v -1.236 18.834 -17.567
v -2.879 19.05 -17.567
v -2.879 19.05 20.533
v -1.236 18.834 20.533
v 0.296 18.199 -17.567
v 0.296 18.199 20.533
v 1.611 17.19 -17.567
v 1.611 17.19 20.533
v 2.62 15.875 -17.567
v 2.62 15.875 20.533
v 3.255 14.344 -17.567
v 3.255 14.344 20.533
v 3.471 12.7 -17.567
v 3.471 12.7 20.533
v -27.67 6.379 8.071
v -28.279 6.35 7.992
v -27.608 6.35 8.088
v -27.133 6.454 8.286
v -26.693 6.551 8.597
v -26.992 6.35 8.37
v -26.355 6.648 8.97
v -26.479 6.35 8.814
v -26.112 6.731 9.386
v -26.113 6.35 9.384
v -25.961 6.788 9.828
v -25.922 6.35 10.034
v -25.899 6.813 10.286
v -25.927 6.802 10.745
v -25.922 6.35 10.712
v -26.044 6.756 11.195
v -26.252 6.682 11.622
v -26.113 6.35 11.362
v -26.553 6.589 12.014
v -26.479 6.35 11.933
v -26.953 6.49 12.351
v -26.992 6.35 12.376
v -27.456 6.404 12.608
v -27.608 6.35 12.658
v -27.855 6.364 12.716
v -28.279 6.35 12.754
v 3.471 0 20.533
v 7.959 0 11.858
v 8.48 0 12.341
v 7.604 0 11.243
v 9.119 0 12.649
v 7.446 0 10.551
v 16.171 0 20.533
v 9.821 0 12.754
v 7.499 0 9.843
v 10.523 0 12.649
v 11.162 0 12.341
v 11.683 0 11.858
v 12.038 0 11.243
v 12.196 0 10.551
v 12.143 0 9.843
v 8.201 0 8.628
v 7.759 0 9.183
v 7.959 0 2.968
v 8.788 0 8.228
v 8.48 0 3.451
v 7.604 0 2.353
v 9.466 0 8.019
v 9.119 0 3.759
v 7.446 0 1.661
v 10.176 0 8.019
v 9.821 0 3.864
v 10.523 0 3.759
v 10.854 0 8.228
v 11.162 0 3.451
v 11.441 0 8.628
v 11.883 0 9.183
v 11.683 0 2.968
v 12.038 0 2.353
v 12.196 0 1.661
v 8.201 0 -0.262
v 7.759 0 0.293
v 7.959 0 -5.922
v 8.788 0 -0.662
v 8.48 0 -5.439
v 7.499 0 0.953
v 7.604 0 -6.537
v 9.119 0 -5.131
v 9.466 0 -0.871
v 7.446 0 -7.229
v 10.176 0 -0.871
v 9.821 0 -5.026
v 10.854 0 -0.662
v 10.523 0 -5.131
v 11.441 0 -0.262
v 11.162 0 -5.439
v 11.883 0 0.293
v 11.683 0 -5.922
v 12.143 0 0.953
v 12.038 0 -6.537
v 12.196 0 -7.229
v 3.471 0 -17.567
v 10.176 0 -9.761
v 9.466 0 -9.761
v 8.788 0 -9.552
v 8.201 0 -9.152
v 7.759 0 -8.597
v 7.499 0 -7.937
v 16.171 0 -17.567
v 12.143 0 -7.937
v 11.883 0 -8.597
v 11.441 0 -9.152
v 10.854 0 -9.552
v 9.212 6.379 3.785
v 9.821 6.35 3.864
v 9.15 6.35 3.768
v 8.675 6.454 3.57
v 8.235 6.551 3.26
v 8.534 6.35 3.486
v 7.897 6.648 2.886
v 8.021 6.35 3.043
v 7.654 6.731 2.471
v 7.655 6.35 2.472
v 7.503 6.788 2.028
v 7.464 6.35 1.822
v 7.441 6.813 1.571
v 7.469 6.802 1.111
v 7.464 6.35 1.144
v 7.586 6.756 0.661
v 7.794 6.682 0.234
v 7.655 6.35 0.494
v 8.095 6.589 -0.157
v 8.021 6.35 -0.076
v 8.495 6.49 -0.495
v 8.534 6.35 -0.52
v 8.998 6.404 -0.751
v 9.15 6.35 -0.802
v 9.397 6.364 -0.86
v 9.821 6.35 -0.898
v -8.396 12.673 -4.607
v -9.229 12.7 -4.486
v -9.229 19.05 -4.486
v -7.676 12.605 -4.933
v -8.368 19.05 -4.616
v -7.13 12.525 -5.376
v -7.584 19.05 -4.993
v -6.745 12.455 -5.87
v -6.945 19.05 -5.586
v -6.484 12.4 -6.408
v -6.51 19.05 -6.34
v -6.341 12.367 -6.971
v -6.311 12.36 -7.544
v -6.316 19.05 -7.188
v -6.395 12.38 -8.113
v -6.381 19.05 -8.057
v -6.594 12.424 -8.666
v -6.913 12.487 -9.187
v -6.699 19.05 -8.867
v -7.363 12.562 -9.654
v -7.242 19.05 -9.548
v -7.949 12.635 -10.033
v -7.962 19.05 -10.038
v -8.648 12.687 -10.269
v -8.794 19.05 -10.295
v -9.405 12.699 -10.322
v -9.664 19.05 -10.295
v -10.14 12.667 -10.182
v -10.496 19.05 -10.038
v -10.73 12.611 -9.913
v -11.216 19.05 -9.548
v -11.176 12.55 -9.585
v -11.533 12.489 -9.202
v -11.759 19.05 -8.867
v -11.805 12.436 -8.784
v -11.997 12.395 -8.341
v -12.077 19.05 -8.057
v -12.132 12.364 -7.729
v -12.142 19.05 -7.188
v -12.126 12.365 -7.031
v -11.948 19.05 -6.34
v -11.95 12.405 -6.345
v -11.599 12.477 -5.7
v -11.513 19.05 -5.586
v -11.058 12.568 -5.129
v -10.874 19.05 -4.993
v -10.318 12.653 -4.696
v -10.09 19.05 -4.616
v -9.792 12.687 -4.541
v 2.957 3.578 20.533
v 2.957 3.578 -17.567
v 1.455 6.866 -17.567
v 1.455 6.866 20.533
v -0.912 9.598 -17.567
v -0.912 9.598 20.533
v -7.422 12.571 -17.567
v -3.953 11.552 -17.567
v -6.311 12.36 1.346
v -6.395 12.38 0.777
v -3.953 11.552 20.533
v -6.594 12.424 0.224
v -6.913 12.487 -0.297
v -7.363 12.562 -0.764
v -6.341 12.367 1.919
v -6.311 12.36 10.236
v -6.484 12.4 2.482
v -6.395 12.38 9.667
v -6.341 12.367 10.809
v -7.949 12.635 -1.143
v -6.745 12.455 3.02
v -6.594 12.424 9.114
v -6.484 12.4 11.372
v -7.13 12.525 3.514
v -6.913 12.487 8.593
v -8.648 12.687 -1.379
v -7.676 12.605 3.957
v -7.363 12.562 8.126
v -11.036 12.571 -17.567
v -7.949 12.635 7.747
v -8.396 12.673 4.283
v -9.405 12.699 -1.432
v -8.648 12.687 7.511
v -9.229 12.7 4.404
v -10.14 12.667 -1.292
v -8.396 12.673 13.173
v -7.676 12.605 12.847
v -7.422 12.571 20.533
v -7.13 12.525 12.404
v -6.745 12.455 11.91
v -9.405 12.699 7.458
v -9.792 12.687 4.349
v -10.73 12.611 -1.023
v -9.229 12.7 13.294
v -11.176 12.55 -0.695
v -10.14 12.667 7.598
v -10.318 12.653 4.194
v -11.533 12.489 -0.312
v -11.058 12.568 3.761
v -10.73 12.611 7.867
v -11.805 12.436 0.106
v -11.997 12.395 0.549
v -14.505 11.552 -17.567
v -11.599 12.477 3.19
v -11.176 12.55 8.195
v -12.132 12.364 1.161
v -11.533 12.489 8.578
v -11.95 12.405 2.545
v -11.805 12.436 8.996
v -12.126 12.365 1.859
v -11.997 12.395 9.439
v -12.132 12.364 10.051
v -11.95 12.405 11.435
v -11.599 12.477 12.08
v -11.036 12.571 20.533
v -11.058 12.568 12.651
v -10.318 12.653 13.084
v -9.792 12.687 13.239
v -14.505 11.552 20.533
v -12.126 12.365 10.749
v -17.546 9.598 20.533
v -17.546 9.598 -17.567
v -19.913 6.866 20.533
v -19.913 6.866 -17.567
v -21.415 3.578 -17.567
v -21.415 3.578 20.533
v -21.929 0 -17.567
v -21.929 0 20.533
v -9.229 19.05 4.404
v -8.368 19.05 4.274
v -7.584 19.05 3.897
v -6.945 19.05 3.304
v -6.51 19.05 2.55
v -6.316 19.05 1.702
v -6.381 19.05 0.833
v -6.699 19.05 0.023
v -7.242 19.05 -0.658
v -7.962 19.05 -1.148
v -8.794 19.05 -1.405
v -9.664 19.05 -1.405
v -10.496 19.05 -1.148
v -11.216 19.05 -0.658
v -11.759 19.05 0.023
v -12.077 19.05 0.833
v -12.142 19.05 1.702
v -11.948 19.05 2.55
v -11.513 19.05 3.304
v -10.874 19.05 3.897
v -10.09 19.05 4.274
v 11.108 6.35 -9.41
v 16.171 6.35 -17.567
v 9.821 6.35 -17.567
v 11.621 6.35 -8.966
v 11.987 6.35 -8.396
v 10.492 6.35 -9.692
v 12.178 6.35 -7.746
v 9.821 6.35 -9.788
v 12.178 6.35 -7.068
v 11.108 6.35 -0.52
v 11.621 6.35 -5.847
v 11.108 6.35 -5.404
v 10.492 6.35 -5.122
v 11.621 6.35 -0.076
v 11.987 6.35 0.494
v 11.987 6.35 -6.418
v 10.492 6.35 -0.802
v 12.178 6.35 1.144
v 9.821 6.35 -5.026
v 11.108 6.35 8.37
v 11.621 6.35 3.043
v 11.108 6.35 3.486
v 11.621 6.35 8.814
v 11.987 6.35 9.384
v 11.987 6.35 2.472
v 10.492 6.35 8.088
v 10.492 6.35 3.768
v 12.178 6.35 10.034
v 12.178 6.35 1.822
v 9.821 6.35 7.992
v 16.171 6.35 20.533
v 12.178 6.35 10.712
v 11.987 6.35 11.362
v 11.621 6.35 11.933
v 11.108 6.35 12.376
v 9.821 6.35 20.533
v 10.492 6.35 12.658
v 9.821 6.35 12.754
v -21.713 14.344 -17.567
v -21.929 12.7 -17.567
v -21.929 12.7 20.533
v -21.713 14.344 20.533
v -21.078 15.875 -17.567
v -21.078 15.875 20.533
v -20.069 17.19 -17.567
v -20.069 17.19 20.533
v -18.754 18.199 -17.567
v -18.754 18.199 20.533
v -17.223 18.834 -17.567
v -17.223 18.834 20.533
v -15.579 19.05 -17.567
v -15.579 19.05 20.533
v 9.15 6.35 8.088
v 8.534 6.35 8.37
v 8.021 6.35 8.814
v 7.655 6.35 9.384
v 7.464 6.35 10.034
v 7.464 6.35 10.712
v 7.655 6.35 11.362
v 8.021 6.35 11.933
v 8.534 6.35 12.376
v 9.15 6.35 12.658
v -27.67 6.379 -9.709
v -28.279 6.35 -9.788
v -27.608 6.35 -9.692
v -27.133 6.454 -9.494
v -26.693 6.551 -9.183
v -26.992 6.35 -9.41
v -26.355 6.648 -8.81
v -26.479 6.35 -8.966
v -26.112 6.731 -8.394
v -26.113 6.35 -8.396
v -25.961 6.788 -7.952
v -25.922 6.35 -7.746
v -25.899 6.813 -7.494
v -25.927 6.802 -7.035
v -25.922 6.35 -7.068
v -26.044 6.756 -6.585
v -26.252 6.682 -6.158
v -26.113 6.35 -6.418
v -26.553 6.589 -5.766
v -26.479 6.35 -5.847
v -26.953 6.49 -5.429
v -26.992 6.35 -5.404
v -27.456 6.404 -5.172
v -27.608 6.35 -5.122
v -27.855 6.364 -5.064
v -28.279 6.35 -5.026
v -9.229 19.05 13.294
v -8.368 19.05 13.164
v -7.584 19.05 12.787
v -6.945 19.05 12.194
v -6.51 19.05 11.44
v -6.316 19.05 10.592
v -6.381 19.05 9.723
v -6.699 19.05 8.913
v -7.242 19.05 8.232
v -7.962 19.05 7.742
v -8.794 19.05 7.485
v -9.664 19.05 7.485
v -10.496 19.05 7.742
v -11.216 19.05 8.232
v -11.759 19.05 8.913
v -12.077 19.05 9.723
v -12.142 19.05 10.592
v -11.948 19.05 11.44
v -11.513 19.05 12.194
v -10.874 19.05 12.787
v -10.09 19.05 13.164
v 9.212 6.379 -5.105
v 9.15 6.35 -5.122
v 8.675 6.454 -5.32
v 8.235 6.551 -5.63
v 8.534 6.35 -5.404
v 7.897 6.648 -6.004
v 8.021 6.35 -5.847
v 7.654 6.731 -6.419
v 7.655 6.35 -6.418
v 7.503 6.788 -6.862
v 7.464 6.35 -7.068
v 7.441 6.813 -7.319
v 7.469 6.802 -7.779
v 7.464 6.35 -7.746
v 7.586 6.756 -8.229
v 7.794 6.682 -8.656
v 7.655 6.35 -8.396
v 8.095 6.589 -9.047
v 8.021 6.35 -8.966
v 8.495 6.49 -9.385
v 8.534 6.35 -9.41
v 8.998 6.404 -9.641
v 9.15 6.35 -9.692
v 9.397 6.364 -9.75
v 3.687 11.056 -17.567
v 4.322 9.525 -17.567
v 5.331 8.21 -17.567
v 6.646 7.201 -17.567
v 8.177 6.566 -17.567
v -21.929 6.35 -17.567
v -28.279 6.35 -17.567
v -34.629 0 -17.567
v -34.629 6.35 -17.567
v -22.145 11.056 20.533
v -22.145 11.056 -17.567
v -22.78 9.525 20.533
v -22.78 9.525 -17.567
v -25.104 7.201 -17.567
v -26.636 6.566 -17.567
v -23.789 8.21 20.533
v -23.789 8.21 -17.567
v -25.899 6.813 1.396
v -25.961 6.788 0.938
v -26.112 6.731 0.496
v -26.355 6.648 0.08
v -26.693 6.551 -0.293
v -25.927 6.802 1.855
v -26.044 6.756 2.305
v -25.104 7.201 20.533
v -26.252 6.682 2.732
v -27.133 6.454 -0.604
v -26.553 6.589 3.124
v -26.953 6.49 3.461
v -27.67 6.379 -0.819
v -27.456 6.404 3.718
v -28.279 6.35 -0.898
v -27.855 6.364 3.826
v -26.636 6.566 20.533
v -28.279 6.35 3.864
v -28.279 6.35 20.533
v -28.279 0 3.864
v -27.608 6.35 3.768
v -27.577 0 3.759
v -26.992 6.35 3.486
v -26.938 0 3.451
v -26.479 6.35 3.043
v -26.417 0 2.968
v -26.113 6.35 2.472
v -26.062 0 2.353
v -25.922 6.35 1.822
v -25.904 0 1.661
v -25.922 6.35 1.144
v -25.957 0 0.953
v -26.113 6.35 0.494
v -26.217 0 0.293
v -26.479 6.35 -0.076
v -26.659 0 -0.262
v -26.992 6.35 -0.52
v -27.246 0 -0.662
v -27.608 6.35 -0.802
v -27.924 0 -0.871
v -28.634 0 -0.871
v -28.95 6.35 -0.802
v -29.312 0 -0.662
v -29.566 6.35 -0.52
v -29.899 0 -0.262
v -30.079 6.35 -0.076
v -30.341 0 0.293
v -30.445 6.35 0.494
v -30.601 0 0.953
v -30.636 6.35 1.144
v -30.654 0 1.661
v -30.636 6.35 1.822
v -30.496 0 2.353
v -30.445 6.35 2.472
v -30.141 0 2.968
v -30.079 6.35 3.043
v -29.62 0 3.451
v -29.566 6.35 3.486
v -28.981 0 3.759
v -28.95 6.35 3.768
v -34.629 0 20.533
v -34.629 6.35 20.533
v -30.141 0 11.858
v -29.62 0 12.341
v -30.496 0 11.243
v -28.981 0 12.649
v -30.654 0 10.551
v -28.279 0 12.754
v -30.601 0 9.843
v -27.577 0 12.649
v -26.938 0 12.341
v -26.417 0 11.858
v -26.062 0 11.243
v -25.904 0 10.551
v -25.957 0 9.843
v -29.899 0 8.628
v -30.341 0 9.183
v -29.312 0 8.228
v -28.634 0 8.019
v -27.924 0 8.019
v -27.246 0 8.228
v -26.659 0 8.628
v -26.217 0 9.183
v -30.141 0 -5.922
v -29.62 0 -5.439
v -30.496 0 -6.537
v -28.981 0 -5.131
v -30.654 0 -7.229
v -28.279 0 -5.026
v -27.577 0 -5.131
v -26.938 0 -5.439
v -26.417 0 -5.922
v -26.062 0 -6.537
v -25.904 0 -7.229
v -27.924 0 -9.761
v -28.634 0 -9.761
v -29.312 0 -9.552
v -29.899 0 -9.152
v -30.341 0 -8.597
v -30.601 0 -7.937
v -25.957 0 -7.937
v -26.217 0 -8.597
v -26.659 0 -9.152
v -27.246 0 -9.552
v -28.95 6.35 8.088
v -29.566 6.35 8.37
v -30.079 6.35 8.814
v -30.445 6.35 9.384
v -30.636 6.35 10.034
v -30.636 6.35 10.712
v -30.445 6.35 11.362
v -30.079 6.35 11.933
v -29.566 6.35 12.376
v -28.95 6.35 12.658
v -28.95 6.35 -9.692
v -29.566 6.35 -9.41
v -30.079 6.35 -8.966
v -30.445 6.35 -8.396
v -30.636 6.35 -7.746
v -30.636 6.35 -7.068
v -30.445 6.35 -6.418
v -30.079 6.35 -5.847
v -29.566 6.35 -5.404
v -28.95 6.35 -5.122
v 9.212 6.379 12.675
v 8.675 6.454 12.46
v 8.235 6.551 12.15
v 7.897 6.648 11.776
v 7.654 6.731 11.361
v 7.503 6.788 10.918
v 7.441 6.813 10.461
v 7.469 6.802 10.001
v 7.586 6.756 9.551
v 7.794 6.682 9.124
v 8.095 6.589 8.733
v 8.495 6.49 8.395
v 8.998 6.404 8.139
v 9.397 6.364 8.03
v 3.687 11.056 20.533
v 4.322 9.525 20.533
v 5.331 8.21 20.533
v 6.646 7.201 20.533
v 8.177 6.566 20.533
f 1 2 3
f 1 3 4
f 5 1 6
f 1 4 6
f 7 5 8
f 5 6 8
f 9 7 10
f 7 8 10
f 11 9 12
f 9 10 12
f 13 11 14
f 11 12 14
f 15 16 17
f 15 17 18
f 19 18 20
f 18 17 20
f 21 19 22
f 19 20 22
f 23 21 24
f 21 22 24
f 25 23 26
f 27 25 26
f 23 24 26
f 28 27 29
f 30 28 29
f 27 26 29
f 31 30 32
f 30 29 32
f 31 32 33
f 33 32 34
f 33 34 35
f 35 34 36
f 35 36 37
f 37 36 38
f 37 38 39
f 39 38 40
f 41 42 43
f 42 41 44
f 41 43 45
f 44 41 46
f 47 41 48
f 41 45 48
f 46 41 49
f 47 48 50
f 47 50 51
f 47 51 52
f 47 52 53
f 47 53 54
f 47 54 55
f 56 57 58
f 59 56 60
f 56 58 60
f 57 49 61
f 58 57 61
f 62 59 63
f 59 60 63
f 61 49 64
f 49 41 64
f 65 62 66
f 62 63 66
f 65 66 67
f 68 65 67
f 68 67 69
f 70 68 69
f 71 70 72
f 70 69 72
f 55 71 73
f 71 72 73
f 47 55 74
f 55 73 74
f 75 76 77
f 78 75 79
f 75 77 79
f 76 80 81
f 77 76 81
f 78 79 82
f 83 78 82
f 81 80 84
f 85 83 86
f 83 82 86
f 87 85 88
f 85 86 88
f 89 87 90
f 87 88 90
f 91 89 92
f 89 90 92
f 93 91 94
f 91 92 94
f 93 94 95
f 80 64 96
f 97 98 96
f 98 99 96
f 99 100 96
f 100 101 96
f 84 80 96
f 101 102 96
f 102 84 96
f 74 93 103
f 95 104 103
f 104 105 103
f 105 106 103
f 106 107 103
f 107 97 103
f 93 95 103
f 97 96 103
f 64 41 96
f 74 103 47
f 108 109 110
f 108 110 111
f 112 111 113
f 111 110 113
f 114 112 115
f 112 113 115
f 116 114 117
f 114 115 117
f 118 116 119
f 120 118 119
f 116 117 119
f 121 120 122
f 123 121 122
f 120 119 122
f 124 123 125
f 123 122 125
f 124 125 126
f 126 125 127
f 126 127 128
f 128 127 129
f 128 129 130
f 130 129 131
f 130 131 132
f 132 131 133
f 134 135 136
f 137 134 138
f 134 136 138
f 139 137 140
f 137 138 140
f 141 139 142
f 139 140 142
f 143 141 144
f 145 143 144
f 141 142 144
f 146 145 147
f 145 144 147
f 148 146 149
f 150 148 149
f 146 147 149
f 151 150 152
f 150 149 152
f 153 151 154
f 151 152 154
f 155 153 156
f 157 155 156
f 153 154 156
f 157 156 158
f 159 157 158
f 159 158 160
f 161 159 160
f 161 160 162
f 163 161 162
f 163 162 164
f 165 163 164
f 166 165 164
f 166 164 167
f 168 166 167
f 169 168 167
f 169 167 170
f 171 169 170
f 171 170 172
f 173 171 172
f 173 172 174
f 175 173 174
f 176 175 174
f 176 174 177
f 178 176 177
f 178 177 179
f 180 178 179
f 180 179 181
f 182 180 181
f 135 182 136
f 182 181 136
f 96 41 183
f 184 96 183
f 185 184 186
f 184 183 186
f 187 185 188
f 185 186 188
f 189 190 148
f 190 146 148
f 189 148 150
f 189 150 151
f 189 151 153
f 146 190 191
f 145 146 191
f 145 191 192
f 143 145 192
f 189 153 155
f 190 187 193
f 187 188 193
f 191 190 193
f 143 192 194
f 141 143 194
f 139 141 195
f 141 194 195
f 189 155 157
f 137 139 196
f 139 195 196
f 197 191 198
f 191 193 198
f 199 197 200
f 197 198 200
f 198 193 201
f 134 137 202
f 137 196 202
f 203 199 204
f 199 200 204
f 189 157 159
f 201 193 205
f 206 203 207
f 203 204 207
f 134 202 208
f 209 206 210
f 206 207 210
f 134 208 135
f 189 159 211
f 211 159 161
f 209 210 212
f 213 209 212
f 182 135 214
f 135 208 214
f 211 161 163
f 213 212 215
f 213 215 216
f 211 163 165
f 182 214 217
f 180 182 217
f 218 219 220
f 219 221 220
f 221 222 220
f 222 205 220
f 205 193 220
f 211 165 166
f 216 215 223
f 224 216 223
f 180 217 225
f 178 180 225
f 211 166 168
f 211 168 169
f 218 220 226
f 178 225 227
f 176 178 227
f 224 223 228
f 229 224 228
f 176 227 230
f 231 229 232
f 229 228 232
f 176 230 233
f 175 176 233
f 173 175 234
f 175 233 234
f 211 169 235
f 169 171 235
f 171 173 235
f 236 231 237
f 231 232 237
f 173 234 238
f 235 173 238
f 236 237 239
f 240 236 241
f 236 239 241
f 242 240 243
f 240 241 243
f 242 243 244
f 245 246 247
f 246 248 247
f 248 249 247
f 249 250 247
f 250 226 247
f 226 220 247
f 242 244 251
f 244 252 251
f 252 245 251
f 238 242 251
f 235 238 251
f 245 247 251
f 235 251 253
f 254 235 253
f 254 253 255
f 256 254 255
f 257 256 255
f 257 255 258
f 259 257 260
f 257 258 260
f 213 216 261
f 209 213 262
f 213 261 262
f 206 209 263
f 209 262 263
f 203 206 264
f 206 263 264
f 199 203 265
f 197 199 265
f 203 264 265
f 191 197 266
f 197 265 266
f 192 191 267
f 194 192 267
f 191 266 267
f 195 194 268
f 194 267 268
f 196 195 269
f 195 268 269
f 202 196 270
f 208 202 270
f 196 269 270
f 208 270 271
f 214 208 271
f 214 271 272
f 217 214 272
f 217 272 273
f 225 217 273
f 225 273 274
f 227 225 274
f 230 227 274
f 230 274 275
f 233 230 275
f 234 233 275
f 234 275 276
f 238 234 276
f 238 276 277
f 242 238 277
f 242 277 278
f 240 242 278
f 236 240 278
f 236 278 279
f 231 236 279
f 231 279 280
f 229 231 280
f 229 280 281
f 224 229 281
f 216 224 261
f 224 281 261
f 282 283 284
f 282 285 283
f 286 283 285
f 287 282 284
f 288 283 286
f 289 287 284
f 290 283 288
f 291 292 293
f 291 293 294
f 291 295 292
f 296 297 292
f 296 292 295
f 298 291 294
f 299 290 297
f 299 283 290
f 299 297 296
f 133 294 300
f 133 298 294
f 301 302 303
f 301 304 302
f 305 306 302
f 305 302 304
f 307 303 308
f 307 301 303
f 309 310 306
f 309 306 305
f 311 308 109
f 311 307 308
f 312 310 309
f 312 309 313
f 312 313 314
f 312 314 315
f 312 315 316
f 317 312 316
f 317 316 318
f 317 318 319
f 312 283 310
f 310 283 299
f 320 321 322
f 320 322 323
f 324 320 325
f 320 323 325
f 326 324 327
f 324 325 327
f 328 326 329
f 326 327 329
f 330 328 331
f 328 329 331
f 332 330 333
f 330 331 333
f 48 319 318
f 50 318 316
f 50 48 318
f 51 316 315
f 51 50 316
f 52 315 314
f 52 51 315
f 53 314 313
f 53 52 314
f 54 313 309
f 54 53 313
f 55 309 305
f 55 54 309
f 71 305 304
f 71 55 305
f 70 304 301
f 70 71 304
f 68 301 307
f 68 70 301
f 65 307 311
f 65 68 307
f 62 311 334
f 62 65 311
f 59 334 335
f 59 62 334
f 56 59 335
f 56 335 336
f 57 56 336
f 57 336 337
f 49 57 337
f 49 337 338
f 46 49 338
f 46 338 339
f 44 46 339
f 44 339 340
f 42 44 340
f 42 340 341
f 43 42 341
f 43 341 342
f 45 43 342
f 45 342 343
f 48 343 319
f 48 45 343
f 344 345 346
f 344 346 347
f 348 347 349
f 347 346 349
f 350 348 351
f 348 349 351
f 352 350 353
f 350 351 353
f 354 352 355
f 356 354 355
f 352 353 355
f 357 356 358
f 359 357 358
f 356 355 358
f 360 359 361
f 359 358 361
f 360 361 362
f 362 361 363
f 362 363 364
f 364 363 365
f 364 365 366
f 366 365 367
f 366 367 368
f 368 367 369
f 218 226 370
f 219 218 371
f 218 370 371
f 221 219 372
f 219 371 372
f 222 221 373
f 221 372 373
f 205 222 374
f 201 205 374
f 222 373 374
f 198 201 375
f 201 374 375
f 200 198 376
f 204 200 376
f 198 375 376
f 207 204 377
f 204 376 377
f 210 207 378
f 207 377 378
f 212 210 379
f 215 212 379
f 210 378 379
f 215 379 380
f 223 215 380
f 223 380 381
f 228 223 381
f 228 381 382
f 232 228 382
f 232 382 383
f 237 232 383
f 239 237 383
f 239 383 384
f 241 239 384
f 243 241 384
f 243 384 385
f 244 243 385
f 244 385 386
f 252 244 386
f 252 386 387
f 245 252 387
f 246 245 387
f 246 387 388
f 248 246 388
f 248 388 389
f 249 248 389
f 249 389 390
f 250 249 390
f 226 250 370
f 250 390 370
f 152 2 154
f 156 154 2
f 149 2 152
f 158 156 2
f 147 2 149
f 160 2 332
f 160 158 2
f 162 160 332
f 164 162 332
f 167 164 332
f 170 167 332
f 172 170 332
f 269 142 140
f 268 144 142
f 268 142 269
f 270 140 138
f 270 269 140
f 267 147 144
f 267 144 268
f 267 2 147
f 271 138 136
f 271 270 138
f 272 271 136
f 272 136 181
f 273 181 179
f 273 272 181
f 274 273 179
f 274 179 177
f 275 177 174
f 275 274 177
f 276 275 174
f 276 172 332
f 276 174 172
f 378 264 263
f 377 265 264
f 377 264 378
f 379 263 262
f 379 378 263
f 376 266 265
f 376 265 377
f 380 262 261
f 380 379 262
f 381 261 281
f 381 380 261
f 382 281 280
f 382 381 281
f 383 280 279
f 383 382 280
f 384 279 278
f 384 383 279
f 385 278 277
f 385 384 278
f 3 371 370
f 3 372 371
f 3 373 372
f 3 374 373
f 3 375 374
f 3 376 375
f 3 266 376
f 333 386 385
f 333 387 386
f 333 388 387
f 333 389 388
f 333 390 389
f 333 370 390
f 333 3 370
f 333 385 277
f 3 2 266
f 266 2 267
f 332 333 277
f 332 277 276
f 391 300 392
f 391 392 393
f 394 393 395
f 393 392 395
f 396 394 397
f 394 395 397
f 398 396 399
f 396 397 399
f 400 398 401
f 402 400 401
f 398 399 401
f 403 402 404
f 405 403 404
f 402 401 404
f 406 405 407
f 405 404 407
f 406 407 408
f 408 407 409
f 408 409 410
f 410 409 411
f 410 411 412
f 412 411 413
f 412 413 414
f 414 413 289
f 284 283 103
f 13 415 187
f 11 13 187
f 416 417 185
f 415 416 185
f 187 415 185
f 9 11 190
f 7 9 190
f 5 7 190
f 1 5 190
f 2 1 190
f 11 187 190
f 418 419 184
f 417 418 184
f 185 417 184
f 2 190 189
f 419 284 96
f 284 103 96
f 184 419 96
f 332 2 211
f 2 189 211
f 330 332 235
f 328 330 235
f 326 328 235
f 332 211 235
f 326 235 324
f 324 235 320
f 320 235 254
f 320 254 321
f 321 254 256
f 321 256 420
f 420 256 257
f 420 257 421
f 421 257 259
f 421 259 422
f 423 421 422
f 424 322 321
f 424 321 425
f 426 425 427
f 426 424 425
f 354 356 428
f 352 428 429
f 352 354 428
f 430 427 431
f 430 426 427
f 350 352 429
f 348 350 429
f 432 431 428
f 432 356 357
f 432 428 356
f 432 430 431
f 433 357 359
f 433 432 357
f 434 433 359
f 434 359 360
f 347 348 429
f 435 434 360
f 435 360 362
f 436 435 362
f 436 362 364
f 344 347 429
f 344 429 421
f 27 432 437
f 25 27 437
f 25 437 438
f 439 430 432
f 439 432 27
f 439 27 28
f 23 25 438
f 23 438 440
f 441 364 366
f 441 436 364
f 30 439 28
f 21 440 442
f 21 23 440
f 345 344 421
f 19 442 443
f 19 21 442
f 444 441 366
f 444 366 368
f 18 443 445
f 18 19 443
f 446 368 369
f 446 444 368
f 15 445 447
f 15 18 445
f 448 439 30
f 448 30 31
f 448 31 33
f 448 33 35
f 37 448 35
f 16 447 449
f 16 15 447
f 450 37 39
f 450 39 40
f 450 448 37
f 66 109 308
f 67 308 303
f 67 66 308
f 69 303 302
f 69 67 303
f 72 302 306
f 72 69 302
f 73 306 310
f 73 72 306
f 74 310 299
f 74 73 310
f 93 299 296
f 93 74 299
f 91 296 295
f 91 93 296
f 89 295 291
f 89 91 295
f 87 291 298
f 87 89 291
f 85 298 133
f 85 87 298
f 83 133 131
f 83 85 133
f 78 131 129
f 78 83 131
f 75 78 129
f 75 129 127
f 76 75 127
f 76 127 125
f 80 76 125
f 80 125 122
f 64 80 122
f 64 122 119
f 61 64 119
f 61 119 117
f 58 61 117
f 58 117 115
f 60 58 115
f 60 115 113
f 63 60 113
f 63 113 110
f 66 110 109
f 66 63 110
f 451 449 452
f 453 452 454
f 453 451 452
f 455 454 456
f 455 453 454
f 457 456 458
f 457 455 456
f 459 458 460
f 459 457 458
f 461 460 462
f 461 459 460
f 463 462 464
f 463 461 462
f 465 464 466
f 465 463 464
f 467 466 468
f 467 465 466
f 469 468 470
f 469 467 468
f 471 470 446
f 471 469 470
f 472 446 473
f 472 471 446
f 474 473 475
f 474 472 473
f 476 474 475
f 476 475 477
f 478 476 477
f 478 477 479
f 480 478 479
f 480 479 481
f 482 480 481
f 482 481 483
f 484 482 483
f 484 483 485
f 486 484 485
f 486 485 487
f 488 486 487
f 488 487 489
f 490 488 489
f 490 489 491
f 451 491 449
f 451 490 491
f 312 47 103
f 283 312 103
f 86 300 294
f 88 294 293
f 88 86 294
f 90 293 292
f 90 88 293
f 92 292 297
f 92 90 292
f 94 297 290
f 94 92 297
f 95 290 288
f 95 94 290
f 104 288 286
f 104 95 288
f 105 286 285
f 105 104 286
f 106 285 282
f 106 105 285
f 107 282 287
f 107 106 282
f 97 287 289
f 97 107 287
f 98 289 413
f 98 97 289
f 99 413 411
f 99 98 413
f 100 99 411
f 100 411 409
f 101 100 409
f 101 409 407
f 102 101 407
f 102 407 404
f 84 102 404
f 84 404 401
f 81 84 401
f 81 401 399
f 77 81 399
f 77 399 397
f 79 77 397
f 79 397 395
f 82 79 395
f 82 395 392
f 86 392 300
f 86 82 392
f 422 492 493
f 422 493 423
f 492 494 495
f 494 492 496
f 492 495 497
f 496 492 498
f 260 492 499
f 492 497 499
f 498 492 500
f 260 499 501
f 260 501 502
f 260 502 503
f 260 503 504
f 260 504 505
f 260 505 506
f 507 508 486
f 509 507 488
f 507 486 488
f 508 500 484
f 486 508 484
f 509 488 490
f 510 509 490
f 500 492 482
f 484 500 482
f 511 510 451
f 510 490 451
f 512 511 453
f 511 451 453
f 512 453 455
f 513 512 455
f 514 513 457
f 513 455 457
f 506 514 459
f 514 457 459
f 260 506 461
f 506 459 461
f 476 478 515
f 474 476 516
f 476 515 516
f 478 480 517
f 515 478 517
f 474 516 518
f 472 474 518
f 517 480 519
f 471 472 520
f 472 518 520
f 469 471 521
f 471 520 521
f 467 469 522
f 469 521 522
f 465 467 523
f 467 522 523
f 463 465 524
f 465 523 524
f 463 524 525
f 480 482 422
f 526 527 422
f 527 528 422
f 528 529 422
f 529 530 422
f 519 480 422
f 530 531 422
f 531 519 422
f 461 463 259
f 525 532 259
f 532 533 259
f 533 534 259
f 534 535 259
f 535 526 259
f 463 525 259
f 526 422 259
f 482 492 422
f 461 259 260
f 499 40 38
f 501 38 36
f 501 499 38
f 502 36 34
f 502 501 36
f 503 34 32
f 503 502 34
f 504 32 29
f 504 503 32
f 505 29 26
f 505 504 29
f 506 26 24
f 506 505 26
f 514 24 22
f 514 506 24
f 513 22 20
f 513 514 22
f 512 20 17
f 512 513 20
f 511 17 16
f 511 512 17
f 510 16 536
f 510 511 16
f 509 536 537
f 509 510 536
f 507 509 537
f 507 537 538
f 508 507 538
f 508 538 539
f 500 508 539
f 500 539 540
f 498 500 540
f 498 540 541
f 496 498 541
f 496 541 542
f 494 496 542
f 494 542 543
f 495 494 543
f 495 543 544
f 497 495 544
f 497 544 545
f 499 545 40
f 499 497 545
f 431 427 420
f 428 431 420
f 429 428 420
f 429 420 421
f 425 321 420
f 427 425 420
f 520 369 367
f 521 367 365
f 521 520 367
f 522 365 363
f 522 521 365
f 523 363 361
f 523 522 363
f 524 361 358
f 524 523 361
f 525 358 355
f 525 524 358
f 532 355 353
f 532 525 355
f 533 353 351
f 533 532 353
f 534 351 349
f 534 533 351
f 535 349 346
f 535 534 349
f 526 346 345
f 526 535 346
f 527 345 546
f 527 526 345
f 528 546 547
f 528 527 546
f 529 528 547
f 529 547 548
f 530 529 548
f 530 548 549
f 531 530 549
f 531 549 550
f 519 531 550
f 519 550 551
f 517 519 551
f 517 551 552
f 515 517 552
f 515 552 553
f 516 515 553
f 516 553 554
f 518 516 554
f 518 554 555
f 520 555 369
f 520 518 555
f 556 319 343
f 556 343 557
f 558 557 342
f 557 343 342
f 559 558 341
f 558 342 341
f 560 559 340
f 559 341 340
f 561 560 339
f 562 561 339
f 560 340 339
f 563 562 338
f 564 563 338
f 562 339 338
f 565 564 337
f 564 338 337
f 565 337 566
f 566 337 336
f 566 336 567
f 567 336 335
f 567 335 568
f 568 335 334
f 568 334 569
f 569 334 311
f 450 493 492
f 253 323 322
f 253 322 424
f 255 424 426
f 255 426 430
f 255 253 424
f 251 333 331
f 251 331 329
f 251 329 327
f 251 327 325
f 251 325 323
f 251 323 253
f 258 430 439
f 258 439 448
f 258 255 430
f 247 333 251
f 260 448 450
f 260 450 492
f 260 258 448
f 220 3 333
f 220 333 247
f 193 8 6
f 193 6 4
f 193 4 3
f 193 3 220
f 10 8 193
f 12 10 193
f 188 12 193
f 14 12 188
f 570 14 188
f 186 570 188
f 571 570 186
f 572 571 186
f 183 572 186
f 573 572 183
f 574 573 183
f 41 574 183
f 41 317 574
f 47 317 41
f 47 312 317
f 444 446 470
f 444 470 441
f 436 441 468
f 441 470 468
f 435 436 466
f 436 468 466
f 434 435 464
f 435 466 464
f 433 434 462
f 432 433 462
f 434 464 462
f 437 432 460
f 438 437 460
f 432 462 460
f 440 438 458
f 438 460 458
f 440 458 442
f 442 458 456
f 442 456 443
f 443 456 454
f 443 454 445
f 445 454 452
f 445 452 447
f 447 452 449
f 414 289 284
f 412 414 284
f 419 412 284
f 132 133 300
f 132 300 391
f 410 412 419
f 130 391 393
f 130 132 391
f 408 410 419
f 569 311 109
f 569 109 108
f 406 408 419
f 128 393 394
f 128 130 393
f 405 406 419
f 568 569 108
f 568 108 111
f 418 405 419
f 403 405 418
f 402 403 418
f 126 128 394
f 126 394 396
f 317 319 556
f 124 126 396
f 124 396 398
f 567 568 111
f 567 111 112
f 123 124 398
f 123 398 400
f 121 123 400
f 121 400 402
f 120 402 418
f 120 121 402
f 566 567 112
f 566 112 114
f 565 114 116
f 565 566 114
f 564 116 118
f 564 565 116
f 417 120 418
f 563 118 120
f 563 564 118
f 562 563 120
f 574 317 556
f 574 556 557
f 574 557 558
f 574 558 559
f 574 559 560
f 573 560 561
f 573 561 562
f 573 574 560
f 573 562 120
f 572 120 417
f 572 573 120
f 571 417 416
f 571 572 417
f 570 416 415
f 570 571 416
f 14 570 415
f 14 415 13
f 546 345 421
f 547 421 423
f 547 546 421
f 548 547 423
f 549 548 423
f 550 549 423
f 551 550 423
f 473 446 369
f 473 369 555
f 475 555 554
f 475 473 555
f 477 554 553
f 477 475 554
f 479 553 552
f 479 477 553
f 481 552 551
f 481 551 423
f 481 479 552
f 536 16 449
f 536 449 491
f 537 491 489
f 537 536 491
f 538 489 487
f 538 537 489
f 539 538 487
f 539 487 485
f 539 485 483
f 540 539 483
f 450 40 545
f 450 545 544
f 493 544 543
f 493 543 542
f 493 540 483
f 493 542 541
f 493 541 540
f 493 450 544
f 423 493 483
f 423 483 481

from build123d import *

# Parameters (mm, degrees)
SKETCH1_W           = 50.8
SKETCH1_H           = 38.1
SKETCH1_R           = 2.38125
BOSS_EXTRUDE1_DEPTH = 25.4
CUT_EXTRUDE1_DEPTH  = 58.410261207
FILLET1_R           = 6.35
SKETCH3_R           = 2.921
CUT_EXTRUDE2_DEPTH  = 25.4


with BuildPart() as part:
    # Sketch1 → Boss-Extrude1 (new body)
    with BuildSketch(Plane(origin=(0, 0, 0), x_dir=(1, 0, 0), z_dir=(0, 1, 0))):
        with Locations((-9.229006509, -1.483233189)):
            Rectangle(SKETCH1_W, SKETCH1_H)
        with Locations(Location((-28.279006509, 7.406766811, 0), (0, 0, 270))):
            Circle(SKETCH1_R, mode=Mode.SUBTRACT)
        with Locations(Location((-28.279006509, -1.483233189, 0), (0, 0, 270))):
            Circle(SKETCH1_R, mode=Mode.SUBTRACT)
        with Locations(Location((-28.279006509, -10.373233189, 0), (0, 0, 270))):
            Circle(SKETCH1_R, mode=Mode.SUBTRACT)
        with Locations(Location((9.820993491, -10.373233189, 0), (0, 0, 270))):
            Circle(SKETCH1_R, mode=Mode.SUBTRACT)
        with Locations(Location((9.820993491, -1.483233189, 0), (0, 0, 270))):
            Circle(SKETCH1_R, mode=Mode.SUBTRACT)
        with Locations(Location((9.820993491, 7.406766811, 0), (0, 0, 270))):
            Circle(SKETCH1_R, mode=Mode.SUBTRACT)
    extrude(amount=BOSS_EXTRUDE1_DEPTH)

    # Sketch2 → Cut-Extrude1 (cut, through all)
    with BuildSketch(Plane.XY.offset(20.533233189)):
        with BuildLine():
            Line((-21.929006509, 0), (3.470993491, 0))
            ThreePointArc((3.470993491, 0), (-9.229006509, 12.7), (-21.929006509, 0))
        make_face()
        Polygon((-25.739006509, 25.4), (7.280993491, 25.4), (16.170993491, 25.4), (16.170993491, 6.35), (3.470993491, 6.35), (3.470993491, 19.05), (-21.929006509, 19.05), (-21.929006509, 6.35), (-34.629006509, 6.35), (-34.629006509, 25.4), align=None)
    extrude(amount=-CUT_EXTRUDE1_DEPTH, mode=Mode.SUBTRACT)

    # Fillet1
    # the kernel refuses this fillet: 6.35 mm, written as the material it adds along each edge
    with BuildSketch(Plane(origin=(3.470993491, 6.35, 20.533233189), x_dir=(1, 0, 0), z_dir=(0, 0, -1))) as fillet1_piece_1_section:
        with BuildLine():
            CenterArc((FILLET1_R, -FILLET1_R), FILLET1_R, 90, 90)
            Line((0, -FILLET1_R), (0, 0))
            Line((0, 0), (FILLET1_R, 0))
        make_face()
    fillet1_piece_1 = extrude(amount=38.1, mode=Mode.PRIVATE)
    fillet1_piece_1 = fillet1_piece_1 - Plane(origin=(9.820993491, 7.811257132, -7.406766811), x_dir=(0, 0, 1), z_dir=(0, -1, 0)) * Cylinder(2.38125, 102, mode=Mode.PRIVATE)
    fillet1_piece_1 = fillet1_piece_1 - Plane(origin=(9.820993491, 7.811257132, 1.483233189), x_dir=(0, 0, 1), z_dir=(0, -1, 0)) * Cylinder(2.38125, 102, mode=Mode.PRIVATE)
    fillet1_piece_1 = fillet1_piece_1 - Plane(origin=(9.820993491, 7.811257132, 10.373233189), x_dir=(0, 0, 1), z_dir=(0, -1, 0)) * Cylinder(2.38125, 102, mode=Mode.PRIVATE)
    add(fillet1_piece_1)
    with BuildSketch(Plane(origin=(-21.929006509, 6.35, 20.533233189), x_dir=(0, 1, 0), z_dir=(0, 0, -1))) as fillet1_piece_2_section:
        with BuildLine():
            CenterArc((FILLET1_R, -FILLET1_R), FILLET1_R, 90, 90)
            Line((0, -FILLET1_R), (0, 0))
            Line((0, 0), (FILLET1_R, 0))
        make_face()
    fillet1_piece_2 = extrude(amount=38.1, mode=Mode.PRIVATE)
    fillet1_piece_2 = fillet1_piece_2 - Plane(origin=(-28.279006509, 7.811257363, -7.406766811), x_dir=(0, 0, 1), z_dir=(0, -1, 0)) * Cylinder(2.38125, 102, mode=Mode.PRIVATE)
    fillet1_piece_2 = fillet1_piece_2 - Plane(origin=(-28.279006509, 7.811257363, 1.483233189), x_dir=(0, 0, 1), z_dir=(0, -1, 0)) * Cylinder(2.38125, 102, mode=Mode.PRIVATE)
    fillet1_piece_2 = fillet1_piece_2 - Plane(origin=(-28.279006509, 7.811257363, 10.373233189), x_dir=(0, 0, 1), z_dir=(0, -1, 0)) * Cylinder(2.38125, 102, mode=Mode.PRIVATE)
    add(fillet1_piece_2)
    # the kernel refuses this fillet: 6.35 mm, written as the material it takes off along each edge
    with BuildSketch(Plane(origin=(3.470993491, 19.05, 36.408233189), x_dir=(0, -1, 0), z_dir=(0, 0, -1)), Plane(origin=(-21.929006509, 19.05, 36.408233189), x_dir=(1, 0, 0), z_dir=(0, 0, -1))) as fillet1_2_piece_1:
        with BuildLine():
            CenterArc((FILLET1_R, FILLET1_R), FILLET1_R, 180, 90)
            Line((0, FILLET1_R), (0, 0))
            Line((0, 0), (FILLET1_R, 0))
        make_face()
    extrude(amount=69.85, mode=Mode.SUBTRACT)

    # Sketch3 → Cut-Extrude2 (cut)
    with BuildSketch(Plane(origin=(0, 19.05, 0), x_dir=(1, 0, 0), z_dir=(0, 1, 0))):
        with Locations(Location((-9.229006509, -1.483233189, 0), (0, 0, 270))):
            Circle(SKETCH3_R)
        with Locations(Location((-9.229006509, 7.406766811, 0), (0, 0, 270))):
            Circle(SKETCH3_R)
        with Locations(Location((-9.229006509, -10.373233189, 0), (0, 0, 270))):
            Circle(SKETCH3_R)
    extrude(amount=-CUT_EXTRUDE2_DEPTH, mode=Mode.SUBTRACT)


solid = part.part
